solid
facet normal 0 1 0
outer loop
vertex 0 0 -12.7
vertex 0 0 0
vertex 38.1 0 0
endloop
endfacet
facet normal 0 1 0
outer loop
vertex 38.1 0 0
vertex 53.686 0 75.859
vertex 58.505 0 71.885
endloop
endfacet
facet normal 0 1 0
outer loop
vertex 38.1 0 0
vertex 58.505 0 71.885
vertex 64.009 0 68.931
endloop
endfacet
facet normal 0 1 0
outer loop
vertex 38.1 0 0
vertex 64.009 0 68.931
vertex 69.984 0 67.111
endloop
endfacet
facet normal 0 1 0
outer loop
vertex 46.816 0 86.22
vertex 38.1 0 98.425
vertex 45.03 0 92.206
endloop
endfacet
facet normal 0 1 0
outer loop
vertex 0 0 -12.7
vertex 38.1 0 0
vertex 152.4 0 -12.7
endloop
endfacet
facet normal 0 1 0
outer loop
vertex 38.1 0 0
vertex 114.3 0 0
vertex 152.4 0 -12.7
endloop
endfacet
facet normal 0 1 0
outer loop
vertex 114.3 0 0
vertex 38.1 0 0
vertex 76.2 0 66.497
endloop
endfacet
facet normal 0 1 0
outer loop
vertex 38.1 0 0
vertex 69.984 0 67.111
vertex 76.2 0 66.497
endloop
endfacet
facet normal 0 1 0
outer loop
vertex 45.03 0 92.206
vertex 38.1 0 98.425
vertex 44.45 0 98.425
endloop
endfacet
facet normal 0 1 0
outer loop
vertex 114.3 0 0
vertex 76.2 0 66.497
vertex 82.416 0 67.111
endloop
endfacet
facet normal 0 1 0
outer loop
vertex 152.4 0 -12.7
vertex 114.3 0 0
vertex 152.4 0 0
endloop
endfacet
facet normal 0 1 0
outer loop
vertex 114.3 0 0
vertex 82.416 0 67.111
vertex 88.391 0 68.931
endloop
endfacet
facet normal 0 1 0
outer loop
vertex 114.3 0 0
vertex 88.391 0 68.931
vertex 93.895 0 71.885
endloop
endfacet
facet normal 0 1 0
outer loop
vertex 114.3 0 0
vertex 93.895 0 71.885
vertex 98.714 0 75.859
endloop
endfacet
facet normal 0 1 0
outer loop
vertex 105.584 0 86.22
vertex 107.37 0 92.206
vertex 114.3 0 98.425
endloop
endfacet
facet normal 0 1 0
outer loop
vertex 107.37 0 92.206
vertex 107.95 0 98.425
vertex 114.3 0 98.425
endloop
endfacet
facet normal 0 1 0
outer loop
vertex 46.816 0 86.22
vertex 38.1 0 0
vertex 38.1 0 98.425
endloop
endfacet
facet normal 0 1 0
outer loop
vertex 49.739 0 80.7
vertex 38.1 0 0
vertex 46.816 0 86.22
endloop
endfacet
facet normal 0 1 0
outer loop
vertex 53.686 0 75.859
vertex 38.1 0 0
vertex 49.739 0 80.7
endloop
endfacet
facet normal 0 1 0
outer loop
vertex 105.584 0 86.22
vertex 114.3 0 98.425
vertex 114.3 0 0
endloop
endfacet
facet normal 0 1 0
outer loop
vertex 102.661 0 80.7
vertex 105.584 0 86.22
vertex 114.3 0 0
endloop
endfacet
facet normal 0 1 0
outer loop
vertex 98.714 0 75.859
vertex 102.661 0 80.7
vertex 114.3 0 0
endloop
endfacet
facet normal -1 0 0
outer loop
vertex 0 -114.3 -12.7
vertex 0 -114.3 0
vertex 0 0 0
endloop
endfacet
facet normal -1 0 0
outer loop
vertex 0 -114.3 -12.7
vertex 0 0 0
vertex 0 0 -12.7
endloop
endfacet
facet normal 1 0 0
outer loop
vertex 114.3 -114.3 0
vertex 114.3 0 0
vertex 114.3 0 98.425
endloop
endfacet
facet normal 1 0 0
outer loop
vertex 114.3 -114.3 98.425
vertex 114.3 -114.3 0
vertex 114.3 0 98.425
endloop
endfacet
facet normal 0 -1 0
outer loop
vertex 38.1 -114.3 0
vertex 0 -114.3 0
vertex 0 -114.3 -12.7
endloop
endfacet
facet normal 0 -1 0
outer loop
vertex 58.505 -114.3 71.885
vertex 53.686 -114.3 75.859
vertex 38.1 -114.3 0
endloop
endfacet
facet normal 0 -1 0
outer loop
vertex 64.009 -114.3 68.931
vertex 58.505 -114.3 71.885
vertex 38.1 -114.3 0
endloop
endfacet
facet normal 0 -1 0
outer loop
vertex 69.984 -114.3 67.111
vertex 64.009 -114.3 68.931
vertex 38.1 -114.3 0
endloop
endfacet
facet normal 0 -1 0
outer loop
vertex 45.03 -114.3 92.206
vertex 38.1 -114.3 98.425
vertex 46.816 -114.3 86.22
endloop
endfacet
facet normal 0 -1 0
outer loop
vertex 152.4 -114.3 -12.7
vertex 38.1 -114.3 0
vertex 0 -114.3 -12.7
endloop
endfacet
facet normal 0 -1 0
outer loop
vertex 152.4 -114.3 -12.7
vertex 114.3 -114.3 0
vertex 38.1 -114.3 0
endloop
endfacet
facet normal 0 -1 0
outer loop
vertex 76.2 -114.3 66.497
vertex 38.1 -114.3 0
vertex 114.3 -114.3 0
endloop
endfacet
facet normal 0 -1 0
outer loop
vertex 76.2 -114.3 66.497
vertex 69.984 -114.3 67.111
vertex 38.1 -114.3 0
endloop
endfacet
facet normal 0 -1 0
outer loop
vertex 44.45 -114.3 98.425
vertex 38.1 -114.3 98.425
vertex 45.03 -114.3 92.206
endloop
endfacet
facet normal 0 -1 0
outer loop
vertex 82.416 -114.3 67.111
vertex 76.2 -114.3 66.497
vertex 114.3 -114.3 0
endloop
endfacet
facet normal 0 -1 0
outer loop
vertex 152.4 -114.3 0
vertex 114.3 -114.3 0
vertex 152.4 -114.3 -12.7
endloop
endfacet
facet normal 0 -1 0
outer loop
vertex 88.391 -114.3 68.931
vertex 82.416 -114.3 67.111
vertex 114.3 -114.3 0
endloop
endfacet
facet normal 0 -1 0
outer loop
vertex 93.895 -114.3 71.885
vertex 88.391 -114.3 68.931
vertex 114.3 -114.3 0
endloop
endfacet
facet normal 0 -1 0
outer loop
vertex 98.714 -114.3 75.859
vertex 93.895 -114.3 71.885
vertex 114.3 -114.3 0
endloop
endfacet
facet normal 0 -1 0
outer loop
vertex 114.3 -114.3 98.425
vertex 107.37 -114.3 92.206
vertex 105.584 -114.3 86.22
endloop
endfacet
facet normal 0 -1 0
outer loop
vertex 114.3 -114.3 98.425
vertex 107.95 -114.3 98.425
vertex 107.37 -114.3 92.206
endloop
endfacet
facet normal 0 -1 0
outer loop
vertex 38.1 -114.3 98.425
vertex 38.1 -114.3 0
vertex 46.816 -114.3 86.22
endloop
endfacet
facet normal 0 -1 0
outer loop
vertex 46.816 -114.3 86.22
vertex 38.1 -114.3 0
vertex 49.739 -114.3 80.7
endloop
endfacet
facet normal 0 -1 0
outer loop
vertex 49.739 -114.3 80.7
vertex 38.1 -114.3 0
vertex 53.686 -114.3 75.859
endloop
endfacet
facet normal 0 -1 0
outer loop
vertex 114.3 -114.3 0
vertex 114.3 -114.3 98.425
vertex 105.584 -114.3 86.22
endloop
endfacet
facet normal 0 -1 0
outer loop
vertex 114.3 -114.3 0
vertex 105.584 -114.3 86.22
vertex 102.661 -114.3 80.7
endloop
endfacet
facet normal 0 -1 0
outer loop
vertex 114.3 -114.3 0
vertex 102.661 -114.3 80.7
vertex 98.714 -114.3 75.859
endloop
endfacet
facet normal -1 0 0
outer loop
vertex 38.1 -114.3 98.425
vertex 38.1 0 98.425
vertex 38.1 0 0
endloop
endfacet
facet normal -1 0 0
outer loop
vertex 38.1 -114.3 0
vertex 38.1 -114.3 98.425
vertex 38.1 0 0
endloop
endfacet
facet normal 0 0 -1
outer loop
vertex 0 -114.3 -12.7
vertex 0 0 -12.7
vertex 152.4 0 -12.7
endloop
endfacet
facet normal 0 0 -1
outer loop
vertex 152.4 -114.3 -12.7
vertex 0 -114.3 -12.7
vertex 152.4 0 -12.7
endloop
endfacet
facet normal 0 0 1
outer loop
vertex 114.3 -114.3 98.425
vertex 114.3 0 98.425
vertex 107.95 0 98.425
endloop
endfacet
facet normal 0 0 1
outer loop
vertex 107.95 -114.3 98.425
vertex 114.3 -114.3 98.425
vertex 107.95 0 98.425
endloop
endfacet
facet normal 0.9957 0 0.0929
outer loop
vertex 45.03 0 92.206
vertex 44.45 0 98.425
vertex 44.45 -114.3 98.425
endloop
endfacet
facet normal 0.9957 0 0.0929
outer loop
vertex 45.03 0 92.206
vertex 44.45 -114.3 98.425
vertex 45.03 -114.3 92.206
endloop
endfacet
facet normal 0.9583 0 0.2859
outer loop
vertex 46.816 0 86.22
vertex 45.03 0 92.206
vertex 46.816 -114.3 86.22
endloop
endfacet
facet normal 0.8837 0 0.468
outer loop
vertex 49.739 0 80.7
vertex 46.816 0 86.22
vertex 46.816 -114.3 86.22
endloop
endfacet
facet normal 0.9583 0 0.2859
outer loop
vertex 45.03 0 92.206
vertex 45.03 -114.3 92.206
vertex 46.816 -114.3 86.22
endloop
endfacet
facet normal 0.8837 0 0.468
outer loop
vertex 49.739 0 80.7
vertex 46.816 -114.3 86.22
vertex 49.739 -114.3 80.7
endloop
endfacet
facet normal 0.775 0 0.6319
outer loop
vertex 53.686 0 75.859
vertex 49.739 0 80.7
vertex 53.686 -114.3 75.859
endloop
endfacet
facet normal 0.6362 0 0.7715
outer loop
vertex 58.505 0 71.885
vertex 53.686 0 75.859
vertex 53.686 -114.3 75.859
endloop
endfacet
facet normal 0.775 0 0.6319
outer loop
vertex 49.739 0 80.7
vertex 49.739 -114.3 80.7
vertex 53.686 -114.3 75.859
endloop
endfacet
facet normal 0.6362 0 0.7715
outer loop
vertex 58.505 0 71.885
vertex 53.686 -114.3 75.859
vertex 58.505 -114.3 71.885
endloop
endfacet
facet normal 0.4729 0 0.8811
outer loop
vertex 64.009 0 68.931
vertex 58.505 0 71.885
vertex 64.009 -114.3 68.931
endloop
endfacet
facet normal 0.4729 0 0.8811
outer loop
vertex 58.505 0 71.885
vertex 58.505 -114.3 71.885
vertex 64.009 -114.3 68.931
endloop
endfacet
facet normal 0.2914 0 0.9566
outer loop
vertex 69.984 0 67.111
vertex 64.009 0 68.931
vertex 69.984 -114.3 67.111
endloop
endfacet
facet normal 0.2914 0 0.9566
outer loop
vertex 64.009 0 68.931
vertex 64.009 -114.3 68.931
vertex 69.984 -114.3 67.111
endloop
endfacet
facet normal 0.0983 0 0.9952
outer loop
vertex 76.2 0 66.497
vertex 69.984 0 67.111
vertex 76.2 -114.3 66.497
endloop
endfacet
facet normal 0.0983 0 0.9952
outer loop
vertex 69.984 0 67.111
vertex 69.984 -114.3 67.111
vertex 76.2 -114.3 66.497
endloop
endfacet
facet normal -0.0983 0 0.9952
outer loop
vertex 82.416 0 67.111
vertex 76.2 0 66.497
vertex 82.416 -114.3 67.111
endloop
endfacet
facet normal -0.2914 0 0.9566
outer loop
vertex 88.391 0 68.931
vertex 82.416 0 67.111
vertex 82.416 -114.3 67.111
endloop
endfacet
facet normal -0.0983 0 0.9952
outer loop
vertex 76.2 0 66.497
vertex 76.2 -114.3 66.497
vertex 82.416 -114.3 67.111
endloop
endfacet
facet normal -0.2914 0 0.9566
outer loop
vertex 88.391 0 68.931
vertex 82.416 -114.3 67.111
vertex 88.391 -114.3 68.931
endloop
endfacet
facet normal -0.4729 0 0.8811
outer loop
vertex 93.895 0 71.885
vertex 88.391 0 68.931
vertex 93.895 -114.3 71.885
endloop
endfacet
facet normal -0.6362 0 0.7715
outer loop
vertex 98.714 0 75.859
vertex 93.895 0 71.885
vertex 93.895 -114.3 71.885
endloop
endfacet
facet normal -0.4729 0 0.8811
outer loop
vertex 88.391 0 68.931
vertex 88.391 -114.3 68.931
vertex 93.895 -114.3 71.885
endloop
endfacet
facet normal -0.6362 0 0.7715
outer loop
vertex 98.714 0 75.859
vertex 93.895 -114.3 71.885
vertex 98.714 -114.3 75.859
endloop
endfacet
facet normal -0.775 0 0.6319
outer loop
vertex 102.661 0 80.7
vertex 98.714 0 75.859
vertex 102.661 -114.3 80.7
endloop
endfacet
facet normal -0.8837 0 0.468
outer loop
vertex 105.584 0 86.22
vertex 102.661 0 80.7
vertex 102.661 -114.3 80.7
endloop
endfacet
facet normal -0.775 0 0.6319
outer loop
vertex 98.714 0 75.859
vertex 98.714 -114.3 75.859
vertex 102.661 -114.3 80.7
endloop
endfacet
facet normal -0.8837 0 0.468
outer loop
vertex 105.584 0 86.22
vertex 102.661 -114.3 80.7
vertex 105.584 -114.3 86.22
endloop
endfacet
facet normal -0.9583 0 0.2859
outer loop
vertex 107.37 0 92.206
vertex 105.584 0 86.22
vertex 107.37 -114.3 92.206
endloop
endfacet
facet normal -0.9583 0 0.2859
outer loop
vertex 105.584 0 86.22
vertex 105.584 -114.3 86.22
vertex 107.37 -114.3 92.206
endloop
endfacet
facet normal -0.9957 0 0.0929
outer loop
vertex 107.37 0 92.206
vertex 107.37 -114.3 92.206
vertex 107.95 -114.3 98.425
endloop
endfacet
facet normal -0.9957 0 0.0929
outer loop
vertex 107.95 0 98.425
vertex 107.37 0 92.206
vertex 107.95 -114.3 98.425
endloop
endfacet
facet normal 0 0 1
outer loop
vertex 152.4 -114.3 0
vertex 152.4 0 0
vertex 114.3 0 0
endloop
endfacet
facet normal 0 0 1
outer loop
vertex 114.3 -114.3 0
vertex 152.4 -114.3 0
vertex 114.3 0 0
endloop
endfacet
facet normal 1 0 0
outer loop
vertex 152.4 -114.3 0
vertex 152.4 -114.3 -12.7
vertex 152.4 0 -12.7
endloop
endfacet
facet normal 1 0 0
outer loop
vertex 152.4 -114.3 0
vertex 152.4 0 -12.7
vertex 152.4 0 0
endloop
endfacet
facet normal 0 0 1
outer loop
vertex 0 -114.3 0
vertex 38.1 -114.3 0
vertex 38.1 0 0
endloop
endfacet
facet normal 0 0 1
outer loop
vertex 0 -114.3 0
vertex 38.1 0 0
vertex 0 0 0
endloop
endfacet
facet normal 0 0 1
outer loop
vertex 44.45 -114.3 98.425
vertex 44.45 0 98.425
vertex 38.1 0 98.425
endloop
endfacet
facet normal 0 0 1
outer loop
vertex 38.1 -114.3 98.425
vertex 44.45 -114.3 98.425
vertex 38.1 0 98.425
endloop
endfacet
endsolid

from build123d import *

# Parameters (mm, degrees)
F1_DEPTH = 114.3
F3_DEPTH = 114.3
F5_DEPTH = 114.301


with BuildPart() as f1:
    # F0 (on Front) → F1 (new body)
    with BuildSketch(Plane.XZ):
        Polygon((38.1, 0), (0, 0), (0, -12.7), (152.4, -12.7), (152.4, 0), (114.3, 0), (114.3, 98.425), (38.1, 98.425), align=None)
    extrude(amount=F1_DEPTH)

    # F2 (on face) → F3 (cut)
    with BuildSketch(Plane.XZ.offset(114.3)):
        with BuildLine():
            Line((107.95, 98.425), (44.45, 98.425))
            ThreePointArc((44.45, 98.425), (76.2, 89.917613), (107.95, 98.425))
        make_face()
    extrude(amount=-F3_DEPTH, mode=Mode.SUBTRACT)

    # F4 (on face) → F5 (cut, through all)
    with BuildSketch(Plane.XZ.offset(114.3)):
        with BuildLine():
            ThreePointArc((107.95, 98.425), (76.2, 89.917613), (44.45, 98.425))
            ThreePointArc((44.45, 98.425), (76.2, 66.496828), (107.95, 98.425))
        make_face()
    extrude(amount=-F5_DEPTH, mode=Mode.SUBTRACT)


solid = f1.part
